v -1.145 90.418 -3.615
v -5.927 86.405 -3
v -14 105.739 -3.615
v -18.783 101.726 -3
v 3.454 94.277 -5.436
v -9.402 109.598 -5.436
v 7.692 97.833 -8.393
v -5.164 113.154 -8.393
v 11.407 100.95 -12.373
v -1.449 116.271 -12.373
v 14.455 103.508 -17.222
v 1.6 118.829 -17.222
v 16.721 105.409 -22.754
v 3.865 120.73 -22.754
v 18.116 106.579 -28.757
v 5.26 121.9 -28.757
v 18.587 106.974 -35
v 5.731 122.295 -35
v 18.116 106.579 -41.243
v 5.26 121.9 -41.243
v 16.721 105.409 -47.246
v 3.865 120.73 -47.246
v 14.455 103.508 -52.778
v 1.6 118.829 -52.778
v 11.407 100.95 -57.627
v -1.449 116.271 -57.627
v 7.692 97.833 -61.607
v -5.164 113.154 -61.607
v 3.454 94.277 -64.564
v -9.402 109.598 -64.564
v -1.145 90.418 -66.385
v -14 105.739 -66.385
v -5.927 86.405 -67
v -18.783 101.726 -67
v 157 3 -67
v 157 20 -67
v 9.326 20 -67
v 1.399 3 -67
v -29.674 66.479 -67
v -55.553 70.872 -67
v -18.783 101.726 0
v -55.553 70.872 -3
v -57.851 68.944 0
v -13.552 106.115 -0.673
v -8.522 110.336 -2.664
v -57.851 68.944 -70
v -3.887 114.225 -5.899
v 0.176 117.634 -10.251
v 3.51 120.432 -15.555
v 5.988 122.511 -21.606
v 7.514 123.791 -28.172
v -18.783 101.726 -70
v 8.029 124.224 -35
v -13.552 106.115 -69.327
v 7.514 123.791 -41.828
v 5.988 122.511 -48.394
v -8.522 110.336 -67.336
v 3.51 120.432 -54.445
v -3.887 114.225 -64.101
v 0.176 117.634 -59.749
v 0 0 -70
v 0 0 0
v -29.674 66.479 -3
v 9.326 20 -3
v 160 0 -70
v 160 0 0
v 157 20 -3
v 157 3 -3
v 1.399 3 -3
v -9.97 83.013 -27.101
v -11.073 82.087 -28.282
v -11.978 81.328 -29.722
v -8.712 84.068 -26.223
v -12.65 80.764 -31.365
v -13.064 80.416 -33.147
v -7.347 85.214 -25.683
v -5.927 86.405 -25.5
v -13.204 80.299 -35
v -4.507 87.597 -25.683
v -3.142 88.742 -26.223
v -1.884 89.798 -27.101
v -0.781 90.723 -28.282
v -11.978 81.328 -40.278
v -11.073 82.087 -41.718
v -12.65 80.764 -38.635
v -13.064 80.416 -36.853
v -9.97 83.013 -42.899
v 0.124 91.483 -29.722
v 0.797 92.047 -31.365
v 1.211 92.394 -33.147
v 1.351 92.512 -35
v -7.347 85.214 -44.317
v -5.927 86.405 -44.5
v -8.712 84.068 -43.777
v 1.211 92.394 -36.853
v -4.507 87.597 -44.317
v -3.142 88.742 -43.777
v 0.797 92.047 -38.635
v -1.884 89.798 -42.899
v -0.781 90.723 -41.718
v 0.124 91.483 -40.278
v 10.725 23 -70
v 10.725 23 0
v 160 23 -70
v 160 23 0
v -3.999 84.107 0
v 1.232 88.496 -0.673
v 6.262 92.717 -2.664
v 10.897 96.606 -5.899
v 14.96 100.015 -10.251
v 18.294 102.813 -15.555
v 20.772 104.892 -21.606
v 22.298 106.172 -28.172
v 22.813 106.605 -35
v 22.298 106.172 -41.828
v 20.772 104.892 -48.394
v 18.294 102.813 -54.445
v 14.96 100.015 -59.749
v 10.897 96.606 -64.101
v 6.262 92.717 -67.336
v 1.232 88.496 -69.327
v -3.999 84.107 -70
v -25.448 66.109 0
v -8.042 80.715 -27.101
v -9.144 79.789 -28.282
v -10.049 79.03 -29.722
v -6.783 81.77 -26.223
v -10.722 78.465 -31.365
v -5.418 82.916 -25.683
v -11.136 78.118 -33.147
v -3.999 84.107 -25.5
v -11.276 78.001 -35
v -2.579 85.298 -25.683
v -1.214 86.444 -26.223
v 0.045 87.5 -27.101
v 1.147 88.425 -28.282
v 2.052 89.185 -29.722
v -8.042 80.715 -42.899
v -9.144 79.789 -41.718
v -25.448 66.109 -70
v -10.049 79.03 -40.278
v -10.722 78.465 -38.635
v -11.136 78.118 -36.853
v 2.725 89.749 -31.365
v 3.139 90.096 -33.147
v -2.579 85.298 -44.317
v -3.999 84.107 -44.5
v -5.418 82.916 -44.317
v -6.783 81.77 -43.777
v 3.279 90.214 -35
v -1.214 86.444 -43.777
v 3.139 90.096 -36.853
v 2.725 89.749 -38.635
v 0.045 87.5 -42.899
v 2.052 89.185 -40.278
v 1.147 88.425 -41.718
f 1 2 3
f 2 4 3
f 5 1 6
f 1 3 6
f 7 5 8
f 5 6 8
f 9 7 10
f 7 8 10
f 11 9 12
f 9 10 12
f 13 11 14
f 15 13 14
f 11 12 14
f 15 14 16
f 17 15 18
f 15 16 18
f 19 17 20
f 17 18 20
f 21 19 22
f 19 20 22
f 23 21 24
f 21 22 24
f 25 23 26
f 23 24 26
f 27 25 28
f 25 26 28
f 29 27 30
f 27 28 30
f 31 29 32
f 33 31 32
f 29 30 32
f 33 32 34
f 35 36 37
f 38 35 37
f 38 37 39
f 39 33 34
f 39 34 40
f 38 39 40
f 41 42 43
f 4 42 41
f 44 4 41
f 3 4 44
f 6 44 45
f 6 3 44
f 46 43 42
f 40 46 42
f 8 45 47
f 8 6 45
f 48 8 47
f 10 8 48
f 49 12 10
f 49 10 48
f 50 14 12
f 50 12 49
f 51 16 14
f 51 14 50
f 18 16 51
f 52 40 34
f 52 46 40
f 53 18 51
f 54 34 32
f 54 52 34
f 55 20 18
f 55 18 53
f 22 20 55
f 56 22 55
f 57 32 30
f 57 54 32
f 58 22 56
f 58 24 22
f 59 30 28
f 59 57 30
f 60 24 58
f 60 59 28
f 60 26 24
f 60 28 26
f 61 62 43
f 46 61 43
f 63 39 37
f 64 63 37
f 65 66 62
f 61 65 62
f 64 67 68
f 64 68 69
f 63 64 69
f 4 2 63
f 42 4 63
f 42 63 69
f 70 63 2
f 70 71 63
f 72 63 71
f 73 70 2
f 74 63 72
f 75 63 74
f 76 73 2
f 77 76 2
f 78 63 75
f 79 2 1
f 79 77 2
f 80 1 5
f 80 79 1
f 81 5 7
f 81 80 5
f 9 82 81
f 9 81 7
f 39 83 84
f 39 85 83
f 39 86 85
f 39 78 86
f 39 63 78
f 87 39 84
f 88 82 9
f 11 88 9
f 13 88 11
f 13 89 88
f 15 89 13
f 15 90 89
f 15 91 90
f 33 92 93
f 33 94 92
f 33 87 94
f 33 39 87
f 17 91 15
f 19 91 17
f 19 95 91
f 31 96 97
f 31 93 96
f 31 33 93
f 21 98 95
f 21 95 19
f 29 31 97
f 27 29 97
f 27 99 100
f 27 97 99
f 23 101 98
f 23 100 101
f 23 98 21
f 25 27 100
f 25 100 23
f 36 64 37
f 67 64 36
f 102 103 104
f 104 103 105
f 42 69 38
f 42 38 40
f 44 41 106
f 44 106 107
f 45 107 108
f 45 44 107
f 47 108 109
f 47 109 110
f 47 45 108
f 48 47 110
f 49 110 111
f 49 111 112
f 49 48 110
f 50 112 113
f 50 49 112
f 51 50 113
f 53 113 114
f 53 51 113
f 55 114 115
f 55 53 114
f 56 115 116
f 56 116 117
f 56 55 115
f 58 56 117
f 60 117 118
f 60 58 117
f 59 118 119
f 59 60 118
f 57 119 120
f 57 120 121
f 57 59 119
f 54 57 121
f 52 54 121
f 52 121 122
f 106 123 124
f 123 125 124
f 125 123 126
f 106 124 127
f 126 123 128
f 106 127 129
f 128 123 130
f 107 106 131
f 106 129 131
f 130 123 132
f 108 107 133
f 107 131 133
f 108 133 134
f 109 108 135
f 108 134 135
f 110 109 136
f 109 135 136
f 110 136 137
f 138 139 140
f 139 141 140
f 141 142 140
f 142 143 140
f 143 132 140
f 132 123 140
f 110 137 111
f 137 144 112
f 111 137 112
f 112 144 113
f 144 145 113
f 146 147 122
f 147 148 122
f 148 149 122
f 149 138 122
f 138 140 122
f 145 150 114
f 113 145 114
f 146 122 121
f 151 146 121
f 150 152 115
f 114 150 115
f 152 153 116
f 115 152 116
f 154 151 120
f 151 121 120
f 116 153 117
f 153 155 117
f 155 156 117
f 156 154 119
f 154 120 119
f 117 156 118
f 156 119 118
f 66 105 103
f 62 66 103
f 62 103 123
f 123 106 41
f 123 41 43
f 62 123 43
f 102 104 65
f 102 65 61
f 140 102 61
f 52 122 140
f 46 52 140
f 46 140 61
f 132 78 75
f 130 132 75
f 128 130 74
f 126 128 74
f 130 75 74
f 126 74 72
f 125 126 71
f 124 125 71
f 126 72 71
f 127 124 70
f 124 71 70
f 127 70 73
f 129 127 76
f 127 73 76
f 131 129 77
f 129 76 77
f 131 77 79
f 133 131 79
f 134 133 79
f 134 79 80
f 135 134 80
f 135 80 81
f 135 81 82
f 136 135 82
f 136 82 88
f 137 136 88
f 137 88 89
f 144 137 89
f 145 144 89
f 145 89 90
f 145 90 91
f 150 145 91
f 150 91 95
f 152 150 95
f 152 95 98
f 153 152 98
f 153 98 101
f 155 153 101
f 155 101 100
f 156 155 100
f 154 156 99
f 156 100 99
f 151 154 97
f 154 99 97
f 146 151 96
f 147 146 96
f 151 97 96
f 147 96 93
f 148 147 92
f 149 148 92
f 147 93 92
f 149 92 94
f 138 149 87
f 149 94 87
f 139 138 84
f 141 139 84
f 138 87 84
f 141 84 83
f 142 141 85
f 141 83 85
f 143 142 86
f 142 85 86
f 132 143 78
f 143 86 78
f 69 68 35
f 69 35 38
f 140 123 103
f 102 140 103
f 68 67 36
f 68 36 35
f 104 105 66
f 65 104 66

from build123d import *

# Parameters (mm, degrees)
BOSS_EXTRU_1_DEPTH      = 70
BOSS_EXTRU_2_DEPTH      = 23
ENL_V_MAT_EXTRU_1_REACH = 240.982
ESQUISSE3_R             = 9.500000000000002
COQUE1_T                = -3


with BuildPart() as part:
    # Esquisse1 → Boss.-Extru.1 (new body)
    with BuildSketch(Plane.XY):
        Polygon((0, 0), (-57.85088487178843, 68.94399988070812), (-18.782618272720498, 101.72616797472158), (-3.9985032499301187, 84.10714578298506), (-25.447747657261537, 66.10909271176199), (10.725076137565006, 23.000000000000007), (160, 23.000000000000004), (160, 2.45e-15), align=None)
    extrude(amount=-BOSS_EXTRU_1_DEPTH)

    # Esquisse2 → Boss.-Extru.2 (add)
    with BuildSketch(Plane(origin=(-57.85088487178846, 68.94399988070815, 0), x_dir=(0.7660444431189791, 0.6427876096865383, 0), z_dir=(-0.6427876096865383, 0.7660444431189791, 0))):
        with BuildLine():
            Line((51.00000000000002, 70), (50.99999999999999, 0))
            ThreePointArc((50.99999999999999, 0), (86.00000000000003, 34.999999999999986), (51.00000000000002, 70))
        make_face()
    extrude(amount=-BOSS_EXTRU_2_DEPTH)

    # Esquisse3 → Enlèv. mat.-Extru.1 (cut, up to next)
    with BuildSketch(Plane(origin=(-57.85088487178846, 68.94399988070815, 0), x_dir=(0.7660444431189791, 0.6427876096865383, 0), z_dir=(-0.6427876096865383, 0.7660444431189791, 0)), mode=Mode.PRIVATE) as enl_v_mat_extru_1_sk1:
        with Locations(Location((51.000000000000036, 35, 0), (0, 0, 180))):
            Circle(ESQUISSE3_R)
    enl_v_mat_extru_1_tool1 = extrude(enl_v_mat_extru_1_sk1.sketch, amount=-ENL_V_MAT_EXTRU_1_REACH, mode=Mode.PRIVATE) & part.part
    add(enl_v_mat_extru_1_tool1.solids().sort_by_distance((-18.782618, 101.726168, -35))[0], mode=Mode.SUBTRACT)

    # Coque1
    coque1_openings = [part.faces().sort_by_distance(p)[0] for p in [
        (-27.96387644, 94.022177633, -35),
        (-4.113138552, 99.023139171, -35),
    ]]
    offset(amount=COQUE1_T, openings=coque1_openings, kind=Kind.INTERSECTION)


solid = part.part
